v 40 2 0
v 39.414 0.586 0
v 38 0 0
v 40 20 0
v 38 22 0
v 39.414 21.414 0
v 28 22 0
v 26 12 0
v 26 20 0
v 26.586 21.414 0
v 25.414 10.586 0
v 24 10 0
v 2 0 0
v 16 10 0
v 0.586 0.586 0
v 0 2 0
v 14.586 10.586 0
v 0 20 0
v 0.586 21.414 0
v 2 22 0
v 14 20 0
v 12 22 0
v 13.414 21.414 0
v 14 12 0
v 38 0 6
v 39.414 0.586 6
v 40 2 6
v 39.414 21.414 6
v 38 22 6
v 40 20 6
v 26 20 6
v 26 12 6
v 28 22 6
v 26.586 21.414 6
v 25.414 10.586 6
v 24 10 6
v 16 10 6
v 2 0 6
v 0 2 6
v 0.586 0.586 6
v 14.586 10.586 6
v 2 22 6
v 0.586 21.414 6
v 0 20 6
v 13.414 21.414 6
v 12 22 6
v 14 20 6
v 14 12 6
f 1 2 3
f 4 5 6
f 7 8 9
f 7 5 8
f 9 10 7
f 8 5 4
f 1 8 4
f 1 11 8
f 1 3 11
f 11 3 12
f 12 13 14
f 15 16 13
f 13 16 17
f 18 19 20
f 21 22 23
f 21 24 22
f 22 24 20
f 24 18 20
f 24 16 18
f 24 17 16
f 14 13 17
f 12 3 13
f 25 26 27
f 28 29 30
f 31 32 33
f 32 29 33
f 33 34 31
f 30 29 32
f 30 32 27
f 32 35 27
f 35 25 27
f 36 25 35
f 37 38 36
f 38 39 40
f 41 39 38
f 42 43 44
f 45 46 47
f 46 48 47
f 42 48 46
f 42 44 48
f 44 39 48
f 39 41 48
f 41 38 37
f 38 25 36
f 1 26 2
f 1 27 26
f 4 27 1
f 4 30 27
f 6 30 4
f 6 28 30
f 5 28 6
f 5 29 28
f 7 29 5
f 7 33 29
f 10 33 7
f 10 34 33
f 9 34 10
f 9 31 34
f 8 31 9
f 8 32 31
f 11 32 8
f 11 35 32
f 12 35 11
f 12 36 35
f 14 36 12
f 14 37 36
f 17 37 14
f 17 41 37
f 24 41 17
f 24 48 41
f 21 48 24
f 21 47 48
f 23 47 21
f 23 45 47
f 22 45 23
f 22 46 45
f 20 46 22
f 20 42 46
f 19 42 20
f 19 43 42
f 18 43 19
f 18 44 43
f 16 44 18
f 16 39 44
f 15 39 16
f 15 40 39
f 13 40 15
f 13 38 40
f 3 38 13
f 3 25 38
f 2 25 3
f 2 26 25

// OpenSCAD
$fn = 32;
// ----------------------------------------------------------------------
// Eye lug: clevis, 6 mm thick
// ----------------------------------------------------------------------

// --- parameters (mm) ---
profile_height = 6;       // extrusion height
profile_points = 24;      // points of the closed outline

profile = [[0, 2], [0.586, 0.586], [2, 0], [38, 0], [39.414, 0.586], [40, 2], [40, 20], [39.414, 21.414], [38, 22], [28, 22], [26.586, 21.414], [26, 20], [26, 12], [25.414, 10.586], [24, 10], [16, 10], [14.586, 10.586], [14, 12], [14, 20], [13.414, 21.414], [12, 22], [2, 22], [0.586, 21.414], [0, 20]];  // single closed polygon, 24 points, counter clockwise

// --- the one profile operation ---
linear_extrude(height = profile_height) polygon(points = profile);
